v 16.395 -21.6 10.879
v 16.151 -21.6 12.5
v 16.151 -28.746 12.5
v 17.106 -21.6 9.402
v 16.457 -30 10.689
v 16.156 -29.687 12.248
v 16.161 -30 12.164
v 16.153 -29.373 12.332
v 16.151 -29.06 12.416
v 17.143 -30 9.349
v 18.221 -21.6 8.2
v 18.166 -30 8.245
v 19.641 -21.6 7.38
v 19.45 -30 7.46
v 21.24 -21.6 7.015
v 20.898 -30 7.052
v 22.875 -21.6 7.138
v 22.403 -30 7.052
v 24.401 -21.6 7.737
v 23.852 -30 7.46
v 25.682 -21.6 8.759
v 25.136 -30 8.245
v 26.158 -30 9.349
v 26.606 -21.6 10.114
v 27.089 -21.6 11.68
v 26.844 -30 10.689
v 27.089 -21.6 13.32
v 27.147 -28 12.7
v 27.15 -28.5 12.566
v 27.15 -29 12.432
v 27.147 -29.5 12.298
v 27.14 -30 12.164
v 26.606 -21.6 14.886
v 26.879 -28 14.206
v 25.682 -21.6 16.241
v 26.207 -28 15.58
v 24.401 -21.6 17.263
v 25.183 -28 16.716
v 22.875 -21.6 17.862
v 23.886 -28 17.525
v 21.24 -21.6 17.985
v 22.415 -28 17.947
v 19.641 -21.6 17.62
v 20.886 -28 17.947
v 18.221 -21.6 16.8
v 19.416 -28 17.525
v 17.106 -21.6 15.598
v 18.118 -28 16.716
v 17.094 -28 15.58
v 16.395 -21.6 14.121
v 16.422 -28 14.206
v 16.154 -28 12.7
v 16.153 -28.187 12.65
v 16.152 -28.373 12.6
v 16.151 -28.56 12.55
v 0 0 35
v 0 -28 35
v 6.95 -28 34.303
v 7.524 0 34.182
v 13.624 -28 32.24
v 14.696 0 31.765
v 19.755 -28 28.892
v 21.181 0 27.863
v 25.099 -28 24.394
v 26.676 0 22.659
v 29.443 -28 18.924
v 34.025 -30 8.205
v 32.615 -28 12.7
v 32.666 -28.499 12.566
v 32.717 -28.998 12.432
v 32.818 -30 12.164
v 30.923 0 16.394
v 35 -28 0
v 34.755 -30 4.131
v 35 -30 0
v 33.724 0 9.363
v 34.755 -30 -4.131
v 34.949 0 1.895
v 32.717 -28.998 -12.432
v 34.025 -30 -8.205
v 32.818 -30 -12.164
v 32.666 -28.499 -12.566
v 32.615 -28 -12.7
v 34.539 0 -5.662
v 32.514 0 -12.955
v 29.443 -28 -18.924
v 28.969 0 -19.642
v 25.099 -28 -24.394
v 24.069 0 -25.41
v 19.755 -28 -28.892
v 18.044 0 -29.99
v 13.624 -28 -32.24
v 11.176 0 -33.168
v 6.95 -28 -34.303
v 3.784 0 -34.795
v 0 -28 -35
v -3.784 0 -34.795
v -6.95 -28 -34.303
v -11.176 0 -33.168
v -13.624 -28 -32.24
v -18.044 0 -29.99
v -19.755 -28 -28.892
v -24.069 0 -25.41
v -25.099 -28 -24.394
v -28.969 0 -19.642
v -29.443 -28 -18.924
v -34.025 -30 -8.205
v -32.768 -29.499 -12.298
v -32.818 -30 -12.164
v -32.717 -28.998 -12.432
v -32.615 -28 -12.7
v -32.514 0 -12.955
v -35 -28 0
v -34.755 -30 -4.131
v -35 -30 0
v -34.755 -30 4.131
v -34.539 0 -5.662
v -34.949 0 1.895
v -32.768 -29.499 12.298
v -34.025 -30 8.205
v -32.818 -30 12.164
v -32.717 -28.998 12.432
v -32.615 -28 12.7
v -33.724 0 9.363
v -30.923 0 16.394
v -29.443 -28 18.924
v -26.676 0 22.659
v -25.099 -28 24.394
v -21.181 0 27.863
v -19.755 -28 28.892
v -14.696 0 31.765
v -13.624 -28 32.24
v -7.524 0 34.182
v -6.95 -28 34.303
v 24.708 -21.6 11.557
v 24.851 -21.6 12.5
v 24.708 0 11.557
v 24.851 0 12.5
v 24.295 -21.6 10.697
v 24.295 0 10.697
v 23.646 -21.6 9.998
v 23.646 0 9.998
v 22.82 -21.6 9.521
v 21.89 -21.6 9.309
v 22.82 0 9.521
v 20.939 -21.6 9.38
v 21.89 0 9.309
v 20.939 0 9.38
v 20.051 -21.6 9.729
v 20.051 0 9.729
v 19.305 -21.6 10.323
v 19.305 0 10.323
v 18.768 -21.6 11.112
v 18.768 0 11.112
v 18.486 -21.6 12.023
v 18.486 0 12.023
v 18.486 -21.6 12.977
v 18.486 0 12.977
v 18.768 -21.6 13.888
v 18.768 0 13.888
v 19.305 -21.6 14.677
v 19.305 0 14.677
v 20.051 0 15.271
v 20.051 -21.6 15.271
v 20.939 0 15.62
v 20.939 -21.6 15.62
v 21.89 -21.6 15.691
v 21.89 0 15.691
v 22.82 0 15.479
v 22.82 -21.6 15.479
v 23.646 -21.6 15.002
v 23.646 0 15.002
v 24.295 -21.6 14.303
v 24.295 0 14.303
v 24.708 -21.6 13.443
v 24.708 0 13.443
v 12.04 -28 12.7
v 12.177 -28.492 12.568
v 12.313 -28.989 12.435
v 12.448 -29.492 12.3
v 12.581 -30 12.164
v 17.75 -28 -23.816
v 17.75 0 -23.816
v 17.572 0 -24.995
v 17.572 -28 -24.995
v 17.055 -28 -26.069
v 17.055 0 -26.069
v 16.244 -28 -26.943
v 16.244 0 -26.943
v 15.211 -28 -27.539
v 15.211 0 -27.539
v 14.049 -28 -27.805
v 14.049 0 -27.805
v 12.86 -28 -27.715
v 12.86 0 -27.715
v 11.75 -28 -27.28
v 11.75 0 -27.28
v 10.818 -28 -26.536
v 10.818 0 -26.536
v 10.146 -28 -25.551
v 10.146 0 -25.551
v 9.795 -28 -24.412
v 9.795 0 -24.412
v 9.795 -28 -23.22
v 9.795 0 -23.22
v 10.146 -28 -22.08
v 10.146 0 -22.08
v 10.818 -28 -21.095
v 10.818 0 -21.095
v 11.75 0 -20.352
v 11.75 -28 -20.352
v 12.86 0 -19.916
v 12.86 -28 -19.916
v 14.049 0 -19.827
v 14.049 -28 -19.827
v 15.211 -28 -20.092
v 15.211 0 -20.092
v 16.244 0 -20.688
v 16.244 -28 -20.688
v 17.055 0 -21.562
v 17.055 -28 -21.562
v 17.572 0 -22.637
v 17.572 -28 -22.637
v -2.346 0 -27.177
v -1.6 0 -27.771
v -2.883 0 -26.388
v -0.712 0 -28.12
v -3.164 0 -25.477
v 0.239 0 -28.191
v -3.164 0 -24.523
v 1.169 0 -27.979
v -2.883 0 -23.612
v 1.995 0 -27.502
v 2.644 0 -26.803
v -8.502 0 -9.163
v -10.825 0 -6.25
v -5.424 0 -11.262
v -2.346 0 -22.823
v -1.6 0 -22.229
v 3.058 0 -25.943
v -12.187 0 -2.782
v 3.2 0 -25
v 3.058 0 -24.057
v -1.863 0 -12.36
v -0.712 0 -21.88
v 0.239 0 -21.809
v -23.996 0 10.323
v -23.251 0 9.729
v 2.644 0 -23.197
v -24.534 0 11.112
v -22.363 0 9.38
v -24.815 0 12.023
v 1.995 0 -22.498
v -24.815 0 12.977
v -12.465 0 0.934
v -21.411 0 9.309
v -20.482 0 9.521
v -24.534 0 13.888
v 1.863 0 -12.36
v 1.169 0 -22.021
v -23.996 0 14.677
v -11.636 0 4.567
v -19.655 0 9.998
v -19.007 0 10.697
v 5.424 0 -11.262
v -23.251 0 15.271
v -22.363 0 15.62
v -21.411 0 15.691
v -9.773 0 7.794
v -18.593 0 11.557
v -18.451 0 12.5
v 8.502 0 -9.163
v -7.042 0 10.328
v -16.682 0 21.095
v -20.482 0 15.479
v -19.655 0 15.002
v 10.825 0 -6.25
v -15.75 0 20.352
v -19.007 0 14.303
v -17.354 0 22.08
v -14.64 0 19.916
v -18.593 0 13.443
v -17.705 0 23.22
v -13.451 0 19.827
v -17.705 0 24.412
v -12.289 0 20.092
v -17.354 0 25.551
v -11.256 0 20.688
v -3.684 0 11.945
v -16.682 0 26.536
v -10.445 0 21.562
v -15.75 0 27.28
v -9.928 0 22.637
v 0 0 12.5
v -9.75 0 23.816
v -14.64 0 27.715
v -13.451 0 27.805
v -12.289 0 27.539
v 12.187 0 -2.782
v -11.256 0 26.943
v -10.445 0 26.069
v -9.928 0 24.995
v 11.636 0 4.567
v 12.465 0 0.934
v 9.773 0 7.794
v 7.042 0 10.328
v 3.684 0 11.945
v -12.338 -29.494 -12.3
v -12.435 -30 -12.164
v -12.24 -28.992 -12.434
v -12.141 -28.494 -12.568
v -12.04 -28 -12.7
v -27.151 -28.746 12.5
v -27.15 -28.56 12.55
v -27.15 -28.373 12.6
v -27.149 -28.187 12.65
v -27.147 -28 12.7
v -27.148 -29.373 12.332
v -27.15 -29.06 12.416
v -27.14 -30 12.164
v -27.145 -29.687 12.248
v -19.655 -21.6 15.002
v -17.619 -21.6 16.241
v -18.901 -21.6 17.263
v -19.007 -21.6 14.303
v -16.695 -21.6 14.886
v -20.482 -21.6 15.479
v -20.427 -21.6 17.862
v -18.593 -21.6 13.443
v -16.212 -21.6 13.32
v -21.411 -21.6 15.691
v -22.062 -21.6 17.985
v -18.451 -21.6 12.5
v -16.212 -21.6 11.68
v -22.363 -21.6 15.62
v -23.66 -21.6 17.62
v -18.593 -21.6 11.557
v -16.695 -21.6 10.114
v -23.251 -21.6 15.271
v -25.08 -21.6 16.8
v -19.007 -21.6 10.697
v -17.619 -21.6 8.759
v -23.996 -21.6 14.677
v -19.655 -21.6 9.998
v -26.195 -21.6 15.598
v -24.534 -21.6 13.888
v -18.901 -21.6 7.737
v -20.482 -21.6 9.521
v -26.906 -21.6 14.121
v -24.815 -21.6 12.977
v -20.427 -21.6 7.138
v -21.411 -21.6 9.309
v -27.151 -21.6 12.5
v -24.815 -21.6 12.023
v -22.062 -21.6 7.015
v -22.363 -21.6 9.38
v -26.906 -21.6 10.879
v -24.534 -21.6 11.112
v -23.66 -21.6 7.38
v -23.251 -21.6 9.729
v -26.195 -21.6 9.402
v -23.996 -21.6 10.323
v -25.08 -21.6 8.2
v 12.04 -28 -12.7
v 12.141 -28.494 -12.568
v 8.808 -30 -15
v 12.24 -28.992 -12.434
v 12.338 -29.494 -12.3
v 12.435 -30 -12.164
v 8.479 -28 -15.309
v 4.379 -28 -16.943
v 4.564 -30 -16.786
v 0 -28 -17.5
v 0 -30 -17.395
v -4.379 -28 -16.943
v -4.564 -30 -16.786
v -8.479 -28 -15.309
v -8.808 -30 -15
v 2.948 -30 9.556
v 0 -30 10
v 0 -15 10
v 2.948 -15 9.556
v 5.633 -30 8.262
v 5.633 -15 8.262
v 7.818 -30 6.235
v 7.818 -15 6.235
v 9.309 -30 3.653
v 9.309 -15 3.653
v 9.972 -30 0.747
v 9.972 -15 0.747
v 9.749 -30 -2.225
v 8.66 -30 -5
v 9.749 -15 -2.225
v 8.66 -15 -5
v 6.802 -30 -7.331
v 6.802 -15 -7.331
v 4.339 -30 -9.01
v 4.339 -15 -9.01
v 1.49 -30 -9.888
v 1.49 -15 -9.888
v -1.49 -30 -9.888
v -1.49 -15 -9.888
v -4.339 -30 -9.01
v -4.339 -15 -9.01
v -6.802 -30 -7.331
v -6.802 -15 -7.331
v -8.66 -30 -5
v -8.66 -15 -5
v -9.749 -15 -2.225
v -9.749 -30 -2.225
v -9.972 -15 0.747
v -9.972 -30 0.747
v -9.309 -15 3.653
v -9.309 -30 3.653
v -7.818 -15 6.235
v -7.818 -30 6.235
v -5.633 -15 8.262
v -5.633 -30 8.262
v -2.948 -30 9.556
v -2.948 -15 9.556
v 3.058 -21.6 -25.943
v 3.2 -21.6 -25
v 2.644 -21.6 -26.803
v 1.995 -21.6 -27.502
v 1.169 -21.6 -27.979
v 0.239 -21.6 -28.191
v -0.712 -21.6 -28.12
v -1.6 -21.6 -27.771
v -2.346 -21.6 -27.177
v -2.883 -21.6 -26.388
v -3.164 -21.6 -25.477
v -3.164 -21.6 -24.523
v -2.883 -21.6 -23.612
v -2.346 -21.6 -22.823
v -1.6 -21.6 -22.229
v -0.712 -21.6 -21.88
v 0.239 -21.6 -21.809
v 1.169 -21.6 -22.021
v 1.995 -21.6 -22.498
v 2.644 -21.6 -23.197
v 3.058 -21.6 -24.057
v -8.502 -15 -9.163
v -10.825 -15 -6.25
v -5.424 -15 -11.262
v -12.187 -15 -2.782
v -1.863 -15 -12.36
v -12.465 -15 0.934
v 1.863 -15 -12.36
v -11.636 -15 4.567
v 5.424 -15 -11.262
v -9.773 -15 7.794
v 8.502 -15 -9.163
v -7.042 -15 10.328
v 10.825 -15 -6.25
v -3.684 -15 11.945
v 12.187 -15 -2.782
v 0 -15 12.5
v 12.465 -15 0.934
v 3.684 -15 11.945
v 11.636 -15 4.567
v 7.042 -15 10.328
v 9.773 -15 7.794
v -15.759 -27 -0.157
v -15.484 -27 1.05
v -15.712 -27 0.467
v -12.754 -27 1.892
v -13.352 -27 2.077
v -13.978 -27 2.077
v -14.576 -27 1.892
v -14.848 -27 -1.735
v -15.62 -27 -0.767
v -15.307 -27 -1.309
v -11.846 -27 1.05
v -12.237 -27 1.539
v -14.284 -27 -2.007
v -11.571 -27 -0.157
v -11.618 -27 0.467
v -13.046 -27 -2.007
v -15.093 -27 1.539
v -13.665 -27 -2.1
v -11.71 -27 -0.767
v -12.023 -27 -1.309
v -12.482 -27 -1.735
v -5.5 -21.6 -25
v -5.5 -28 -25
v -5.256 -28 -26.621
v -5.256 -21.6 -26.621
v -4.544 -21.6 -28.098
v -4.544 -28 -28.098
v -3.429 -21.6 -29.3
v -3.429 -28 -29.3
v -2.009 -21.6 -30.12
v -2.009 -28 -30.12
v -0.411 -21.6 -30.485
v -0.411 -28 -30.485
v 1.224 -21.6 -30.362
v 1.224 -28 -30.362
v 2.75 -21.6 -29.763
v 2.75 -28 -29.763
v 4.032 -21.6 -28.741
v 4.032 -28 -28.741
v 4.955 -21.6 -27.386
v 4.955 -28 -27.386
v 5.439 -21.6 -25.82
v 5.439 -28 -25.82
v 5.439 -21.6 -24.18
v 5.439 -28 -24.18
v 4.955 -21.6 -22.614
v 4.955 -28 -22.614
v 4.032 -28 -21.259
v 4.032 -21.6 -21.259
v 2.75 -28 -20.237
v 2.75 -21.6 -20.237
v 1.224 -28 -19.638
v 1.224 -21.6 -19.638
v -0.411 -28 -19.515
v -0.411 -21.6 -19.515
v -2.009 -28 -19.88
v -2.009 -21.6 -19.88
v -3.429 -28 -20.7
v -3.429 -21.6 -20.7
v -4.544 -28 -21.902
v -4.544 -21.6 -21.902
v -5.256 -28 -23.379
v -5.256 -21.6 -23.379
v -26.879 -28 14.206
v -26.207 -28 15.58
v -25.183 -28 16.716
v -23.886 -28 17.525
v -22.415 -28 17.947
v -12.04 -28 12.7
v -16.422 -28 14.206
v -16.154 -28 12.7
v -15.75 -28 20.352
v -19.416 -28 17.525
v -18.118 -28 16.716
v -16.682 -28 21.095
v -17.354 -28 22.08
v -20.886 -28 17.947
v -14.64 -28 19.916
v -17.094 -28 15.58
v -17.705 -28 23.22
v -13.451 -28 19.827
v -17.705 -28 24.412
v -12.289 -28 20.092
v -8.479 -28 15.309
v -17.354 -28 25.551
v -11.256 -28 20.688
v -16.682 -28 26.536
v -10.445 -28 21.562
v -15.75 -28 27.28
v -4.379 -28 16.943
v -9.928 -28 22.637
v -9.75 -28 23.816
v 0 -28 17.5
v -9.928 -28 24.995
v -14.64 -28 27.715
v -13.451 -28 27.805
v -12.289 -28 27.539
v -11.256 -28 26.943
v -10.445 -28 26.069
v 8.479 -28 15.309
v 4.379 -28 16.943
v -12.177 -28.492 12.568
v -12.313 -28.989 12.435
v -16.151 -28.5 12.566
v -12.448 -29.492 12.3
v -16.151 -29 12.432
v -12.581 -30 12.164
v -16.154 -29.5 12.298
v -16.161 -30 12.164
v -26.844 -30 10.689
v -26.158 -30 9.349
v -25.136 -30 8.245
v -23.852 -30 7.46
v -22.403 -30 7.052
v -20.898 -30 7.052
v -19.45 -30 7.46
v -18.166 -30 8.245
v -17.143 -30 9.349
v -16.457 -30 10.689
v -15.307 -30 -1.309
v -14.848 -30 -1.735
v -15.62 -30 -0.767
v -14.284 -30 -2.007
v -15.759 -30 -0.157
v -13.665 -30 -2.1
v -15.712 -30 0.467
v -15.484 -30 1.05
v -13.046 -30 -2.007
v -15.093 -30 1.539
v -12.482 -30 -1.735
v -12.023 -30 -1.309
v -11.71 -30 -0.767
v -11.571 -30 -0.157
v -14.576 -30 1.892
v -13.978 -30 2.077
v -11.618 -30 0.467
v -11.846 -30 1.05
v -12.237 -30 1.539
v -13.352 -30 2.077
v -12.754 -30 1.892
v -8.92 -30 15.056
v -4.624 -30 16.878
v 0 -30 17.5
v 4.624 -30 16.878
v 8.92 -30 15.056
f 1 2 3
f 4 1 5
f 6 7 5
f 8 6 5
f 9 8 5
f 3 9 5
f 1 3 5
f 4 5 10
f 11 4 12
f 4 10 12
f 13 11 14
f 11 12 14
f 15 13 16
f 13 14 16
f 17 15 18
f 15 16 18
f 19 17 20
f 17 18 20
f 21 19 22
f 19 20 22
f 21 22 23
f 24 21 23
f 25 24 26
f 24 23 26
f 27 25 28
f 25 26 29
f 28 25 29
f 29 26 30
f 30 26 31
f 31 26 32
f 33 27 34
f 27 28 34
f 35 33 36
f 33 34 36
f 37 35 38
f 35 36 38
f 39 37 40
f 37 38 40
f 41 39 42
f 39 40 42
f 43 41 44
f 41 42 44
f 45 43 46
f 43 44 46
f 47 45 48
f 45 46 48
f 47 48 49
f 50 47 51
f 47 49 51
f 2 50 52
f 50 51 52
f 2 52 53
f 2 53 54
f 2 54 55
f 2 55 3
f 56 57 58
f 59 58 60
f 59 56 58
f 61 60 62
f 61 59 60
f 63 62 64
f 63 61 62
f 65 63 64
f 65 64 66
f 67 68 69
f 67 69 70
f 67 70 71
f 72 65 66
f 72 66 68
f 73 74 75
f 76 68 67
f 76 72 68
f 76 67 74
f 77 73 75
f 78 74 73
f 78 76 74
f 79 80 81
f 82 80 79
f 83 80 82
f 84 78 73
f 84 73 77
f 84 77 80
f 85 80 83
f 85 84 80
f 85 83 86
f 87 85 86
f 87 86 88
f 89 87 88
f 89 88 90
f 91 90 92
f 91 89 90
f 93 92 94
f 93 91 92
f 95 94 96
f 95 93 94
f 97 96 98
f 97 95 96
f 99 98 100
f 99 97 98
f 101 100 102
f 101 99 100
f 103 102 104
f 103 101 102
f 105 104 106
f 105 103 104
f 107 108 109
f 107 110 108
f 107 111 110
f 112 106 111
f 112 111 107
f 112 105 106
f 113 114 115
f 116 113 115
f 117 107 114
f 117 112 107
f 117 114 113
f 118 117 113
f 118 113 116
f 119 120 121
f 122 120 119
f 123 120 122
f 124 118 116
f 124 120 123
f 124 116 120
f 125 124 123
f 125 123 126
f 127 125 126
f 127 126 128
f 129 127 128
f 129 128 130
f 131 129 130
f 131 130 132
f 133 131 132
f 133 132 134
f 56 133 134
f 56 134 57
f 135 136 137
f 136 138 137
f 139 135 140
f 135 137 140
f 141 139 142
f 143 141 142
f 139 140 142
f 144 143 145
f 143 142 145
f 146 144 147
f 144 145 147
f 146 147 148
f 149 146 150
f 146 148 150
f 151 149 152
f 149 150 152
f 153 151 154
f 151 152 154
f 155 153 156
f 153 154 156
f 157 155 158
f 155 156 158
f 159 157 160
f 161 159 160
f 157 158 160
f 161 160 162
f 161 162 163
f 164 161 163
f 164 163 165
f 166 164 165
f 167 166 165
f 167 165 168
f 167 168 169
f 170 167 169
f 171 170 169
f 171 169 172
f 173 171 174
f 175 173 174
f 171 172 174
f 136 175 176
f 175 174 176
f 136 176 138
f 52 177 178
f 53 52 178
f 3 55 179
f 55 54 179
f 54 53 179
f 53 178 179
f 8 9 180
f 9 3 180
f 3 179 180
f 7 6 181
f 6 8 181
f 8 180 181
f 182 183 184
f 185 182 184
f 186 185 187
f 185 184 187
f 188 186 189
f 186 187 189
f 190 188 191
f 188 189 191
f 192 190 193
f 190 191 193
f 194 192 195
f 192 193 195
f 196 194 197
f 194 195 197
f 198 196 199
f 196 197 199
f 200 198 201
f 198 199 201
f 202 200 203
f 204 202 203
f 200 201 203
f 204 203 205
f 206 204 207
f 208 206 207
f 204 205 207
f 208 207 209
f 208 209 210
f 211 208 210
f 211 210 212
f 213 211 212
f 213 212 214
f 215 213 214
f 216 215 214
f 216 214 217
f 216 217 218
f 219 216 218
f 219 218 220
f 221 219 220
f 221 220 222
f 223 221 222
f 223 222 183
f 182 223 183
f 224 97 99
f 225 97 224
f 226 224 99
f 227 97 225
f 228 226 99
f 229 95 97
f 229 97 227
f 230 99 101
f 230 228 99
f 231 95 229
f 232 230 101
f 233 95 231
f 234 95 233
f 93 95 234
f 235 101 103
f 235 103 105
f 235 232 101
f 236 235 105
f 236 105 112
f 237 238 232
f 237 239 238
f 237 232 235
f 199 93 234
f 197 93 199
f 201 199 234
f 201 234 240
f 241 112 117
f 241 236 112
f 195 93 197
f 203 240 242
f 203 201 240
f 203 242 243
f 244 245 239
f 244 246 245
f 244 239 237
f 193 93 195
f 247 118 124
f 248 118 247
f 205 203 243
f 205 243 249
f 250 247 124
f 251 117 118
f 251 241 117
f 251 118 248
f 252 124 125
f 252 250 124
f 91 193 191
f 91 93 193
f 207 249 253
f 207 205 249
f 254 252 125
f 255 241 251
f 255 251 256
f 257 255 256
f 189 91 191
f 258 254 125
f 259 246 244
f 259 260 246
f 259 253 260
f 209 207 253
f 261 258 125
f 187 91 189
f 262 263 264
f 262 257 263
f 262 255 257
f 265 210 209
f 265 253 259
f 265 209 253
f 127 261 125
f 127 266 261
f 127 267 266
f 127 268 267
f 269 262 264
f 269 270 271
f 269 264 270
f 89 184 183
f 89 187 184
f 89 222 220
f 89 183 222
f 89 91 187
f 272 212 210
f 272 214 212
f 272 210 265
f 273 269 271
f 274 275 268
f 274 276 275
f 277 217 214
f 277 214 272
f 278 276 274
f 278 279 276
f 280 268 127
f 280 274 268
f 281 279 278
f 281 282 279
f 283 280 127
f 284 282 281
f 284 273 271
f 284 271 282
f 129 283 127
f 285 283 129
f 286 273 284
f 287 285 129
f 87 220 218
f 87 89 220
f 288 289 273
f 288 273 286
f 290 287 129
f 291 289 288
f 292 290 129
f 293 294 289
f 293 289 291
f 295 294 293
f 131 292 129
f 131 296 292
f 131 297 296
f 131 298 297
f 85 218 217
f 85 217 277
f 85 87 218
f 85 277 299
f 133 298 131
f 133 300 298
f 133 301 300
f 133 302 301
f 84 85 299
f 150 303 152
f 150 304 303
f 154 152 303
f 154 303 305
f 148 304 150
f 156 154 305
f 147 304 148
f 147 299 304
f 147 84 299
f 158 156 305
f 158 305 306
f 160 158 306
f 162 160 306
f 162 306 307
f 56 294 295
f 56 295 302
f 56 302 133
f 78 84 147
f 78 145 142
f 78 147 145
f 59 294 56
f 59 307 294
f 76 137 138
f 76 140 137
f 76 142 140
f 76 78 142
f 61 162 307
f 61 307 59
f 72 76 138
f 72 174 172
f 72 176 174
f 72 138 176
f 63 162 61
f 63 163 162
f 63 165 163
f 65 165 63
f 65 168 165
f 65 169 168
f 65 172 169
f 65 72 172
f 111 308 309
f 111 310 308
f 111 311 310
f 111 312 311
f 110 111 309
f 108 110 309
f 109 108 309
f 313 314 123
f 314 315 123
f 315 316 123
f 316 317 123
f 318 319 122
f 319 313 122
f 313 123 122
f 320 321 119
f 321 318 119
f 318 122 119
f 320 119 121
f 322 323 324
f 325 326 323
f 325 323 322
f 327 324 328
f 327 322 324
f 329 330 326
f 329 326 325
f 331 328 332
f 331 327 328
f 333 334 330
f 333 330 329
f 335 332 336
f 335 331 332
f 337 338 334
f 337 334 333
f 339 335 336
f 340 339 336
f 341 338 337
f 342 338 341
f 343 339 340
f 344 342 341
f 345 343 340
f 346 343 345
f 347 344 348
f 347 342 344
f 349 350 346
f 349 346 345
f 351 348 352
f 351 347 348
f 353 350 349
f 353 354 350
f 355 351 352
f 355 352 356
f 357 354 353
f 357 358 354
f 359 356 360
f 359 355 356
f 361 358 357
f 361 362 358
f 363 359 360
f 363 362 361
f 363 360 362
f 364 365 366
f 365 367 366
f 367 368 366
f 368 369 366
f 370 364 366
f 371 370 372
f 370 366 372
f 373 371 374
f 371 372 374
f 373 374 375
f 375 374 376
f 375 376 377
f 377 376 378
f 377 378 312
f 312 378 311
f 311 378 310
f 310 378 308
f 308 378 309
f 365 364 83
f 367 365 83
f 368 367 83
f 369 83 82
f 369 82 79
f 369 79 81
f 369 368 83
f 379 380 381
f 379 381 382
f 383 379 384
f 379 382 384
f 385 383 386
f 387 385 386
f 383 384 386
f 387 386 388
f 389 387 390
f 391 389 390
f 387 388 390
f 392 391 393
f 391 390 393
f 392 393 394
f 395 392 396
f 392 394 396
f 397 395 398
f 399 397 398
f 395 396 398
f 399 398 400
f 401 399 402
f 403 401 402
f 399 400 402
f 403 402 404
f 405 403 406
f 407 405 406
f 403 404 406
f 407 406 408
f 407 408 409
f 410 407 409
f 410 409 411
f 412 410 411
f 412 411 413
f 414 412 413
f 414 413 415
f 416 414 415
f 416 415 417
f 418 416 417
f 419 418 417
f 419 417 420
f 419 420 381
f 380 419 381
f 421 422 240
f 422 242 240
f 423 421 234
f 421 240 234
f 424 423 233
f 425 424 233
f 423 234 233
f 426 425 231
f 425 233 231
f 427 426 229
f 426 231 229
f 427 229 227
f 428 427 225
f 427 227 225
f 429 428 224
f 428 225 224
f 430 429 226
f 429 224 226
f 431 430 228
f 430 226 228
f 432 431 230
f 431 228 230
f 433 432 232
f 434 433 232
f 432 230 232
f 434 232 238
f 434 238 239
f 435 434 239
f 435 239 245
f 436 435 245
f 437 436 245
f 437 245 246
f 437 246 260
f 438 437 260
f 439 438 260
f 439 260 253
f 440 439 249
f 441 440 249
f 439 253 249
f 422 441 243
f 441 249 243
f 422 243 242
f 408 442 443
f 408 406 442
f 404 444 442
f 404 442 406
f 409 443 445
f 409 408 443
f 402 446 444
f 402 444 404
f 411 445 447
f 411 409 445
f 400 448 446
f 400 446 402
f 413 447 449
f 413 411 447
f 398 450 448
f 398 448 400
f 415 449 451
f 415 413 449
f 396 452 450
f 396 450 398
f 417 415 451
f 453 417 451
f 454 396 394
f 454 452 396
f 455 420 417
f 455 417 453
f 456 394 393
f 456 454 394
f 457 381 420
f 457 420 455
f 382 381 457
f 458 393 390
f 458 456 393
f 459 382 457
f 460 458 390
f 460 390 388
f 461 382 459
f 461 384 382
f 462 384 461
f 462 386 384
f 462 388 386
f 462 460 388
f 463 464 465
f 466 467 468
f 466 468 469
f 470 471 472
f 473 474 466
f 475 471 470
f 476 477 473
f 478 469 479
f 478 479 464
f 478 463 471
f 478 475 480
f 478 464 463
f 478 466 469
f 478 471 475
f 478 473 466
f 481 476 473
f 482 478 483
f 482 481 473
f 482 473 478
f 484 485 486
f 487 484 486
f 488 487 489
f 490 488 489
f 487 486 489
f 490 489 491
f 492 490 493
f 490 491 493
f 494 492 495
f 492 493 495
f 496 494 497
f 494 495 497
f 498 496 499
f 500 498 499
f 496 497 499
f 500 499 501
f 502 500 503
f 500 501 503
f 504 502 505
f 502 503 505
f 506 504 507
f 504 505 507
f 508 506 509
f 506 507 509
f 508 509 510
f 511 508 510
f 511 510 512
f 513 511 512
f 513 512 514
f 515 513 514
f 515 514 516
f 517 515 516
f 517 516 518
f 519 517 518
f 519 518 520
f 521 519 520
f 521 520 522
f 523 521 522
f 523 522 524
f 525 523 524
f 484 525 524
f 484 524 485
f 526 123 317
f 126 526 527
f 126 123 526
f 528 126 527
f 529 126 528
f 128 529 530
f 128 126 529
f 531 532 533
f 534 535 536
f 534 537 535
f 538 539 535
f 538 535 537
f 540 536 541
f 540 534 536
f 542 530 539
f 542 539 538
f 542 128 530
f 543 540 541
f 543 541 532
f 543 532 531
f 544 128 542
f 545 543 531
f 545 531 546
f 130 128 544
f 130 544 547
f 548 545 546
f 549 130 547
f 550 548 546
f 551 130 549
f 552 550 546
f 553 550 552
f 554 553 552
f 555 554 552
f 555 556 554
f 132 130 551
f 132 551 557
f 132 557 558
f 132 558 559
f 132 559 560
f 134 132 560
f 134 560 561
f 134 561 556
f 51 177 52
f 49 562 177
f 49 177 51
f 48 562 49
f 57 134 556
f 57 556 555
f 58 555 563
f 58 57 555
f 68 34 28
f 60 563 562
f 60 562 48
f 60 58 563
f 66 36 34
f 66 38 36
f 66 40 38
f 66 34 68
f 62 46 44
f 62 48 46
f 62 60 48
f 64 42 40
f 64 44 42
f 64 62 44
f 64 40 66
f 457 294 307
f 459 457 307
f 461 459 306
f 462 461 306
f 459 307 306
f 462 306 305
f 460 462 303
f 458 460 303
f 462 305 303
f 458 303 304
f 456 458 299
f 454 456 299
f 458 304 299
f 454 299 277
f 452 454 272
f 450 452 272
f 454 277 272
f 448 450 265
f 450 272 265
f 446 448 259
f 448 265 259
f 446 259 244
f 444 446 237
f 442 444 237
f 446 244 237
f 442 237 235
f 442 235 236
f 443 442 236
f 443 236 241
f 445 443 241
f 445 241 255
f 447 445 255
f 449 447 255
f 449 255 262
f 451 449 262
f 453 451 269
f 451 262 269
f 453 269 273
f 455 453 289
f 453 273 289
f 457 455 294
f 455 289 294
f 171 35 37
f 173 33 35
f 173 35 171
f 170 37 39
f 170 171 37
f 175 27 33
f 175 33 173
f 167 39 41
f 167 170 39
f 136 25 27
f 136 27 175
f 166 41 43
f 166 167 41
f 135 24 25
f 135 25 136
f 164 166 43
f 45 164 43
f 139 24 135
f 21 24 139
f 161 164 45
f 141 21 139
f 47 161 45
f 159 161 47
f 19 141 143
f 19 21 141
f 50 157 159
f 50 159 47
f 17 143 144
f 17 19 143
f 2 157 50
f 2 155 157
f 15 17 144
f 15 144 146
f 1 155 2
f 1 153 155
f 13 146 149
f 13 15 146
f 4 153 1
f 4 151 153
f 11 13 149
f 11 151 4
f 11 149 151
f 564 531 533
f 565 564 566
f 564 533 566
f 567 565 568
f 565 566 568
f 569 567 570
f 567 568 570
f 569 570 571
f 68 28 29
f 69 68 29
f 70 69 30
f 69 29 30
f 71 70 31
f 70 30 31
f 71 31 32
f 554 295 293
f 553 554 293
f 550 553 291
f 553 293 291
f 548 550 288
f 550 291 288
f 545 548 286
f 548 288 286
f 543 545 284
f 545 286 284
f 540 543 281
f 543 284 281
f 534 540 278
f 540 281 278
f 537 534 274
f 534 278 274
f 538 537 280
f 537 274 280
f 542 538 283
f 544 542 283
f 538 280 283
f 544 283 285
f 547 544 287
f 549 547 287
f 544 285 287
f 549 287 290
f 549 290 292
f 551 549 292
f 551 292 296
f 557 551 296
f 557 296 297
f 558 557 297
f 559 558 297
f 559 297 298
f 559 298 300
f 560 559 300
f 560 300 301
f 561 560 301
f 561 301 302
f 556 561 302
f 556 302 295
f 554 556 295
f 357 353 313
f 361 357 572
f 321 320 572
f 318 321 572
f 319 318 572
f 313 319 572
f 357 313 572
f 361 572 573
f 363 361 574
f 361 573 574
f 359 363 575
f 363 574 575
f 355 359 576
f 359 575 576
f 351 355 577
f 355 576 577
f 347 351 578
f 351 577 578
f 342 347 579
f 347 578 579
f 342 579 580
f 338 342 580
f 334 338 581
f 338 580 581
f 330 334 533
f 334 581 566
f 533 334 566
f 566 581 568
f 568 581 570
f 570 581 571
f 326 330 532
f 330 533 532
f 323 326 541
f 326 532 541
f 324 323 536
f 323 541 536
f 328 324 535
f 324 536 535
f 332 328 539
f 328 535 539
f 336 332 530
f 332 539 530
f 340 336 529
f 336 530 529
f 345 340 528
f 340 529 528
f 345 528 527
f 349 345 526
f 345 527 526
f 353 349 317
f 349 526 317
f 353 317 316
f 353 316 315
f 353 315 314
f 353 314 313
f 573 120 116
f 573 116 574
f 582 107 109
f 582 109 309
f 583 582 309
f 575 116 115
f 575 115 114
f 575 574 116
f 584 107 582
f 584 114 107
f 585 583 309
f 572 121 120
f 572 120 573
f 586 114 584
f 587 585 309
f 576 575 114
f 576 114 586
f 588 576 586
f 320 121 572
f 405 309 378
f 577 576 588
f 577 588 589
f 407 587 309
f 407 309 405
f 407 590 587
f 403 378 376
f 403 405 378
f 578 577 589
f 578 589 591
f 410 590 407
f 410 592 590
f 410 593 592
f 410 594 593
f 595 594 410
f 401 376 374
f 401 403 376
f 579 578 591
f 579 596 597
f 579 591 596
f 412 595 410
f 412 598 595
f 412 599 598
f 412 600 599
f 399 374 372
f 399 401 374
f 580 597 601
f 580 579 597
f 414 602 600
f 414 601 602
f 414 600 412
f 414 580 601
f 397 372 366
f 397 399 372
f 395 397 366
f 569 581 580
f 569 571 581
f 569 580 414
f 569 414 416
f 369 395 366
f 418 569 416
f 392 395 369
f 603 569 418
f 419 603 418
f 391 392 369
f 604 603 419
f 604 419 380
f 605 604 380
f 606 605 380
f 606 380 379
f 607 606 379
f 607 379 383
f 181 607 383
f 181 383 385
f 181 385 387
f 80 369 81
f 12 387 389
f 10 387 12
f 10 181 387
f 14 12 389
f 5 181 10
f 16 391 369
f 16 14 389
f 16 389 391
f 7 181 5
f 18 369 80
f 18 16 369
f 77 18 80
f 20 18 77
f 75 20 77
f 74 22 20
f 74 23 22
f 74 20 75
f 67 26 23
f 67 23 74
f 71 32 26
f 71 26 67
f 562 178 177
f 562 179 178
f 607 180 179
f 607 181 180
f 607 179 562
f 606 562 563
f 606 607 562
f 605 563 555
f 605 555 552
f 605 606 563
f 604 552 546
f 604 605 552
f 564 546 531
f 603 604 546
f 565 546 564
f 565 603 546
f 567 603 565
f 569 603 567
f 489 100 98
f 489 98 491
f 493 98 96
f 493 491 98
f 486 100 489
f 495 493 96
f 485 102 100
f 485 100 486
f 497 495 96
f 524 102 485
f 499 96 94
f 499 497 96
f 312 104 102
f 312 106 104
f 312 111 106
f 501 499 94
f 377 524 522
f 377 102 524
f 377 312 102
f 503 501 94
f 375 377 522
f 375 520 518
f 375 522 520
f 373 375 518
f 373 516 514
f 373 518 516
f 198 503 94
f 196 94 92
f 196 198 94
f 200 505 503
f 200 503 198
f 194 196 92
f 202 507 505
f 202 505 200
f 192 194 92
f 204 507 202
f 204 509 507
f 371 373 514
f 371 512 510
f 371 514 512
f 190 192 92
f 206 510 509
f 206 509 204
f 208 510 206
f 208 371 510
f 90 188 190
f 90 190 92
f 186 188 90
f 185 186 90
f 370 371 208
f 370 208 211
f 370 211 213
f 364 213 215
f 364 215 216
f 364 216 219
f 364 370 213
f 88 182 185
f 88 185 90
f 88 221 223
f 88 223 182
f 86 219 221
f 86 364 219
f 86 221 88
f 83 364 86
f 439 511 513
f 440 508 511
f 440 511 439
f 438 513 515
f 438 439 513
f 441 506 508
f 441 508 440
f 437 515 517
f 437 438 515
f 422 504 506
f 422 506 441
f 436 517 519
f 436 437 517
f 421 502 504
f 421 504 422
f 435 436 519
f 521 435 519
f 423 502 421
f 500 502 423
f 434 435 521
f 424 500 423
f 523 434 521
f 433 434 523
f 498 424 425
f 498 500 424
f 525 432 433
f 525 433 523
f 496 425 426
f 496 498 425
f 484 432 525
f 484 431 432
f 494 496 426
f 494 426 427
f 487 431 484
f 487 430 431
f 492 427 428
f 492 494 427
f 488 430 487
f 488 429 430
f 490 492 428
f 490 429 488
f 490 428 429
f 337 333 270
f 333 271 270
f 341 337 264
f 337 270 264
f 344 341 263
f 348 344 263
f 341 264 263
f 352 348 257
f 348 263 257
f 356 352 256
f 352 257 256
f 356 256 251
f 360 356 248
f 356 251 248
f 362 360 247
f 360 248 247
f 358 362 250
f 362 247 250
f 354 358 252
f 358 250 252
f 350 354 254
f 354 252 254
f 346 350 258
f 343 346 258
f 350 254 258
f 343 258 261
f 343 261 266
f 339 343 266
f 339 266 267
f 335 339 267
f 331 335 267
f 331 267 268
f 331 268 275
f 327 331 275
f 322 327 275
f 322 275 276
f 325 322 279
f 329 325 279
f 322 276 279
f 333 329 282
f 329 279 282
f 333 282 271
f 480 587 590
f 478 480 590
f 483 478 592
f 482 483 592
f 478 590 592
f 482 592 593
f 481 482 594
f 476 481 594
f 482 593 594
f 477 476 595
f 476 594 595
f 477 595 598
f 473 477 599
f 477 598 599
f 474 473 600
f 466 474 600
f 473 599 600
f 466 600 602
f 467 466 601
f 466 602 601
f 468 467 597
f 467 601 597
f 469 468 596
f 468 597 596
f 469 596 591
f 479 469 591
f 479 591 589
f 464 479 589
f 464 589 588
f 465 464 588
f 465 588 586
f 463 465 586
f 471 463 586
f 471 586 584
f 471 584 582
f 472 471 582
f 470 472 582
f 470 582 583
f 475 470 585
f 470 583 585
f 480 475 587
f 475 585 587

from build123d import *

# Parameters (mm, degrees)
SKETCH1_R                                           = 35
SKETCH1_R_2                                         = 10
BOSS_EXTRUDE1_DEPTH                                 = 30
SKETCH4_R                                           = 12.5
CUT_EXTRUDE2_DEPTH                                  = 15
CBORE_FOR_M6_HEX_SOCKET_HEAD_CAP_SCREW1_D           = 6.4
CBORE_FOR_M6_HEX_SOCKET_HEAD_CAP_SCREW1_CBORE_D     = 11
CBORE_FOR_M6_HEX_SOCKET_HEAD_CAP_SCREW1_CBORE_DEPTH = 8.4
F_8_0MM_DOWEL_HOLE1_D                               = 8
SKETCH14_OUTSIDE_W                                  = 92.688
SKETCH14_OUTSIDE_H                                  = 92.688
SKETCH14_OUTSIDE_W_2                                = 70
SKETCH14_OUTSIDE_H_2                                = 25.4
CUT_EXTRUDE3_DEPTH                                  = 2
SKETCH18_R                                          = 2.1
CUT_EXTRUDE5_DEPTH                                  = 3
CUT_EXTRUDE6_DEPTH                                  = 58.879184825
CUT_EXTRUDE6_DEPTH_BACK                             = 58.879184825
BOSS_EXTRUDE2_DEPTH                                 = 2
DRAFT1_ANGLE                                        = 3


with BuildPart() as part:
    # Sketch1 → Boss-Extrude1 (new body)
    with BuildSketch(Plane(origin=(0, 0, 0), x_dir=(1, 0, 0), z_dir=(0, 1, 0))):
        with Locations(Location((0, 0, 0), (0, 0, 270))):
            Circle(SKETCH1_R)
        with Locations(Location((0, 0, 0), (0, 0, 270))):
            Circle(SKETCH1_R_2, mode=Mode.SUBTRACT)
    extrude(amount=-BOSS_EXTRUDE1_DEPTH)

    # Sketch4 → Cut-Extrude2 (cut)
    with BuildSketch(Plane(origin=(0, 0, 0), x_dir=(1, 0, 0), z_dir=(0, 1, 0))):
        with Locations(Location((0, 0, 0), (0, 0, 270))):
            Circle(SKETCH4_R)
    extrude(amount=-CUT_EXTRUDE2_DEPTH, mode=Mode.SUBTRACT)

    # CBORE for M6 Hex Socket Head Cap Screw1 (through all)
    with Locations(Plane(origin=(0, -30, 0), x_dir=(-1, 0, 0), z_dir=(0, -1, 0))):
        with Locations((0, 25), (21.650635095, -12.5), (-21.650635095, -12.5)):
            CounterBoreHole(CBORE_FOR_M6_HEX_SOCKET_HEAD_CAP_SCREW1_D / 2, CBORE_FOR_M6_HEX_SOCKET_HEAD_CAP_SCREW1_CBORE_D / 2, CBORE_FOR_M6_HEX_SOCKET_HEAD_CAP_SCREW1_CBORE_DEPTH)

    # Ø8.0mm Dowel Hole1 (through all)
    with Locations(Plane(origin=(0, -30, 0), x_dir=(-1, 0, 0), z_dir=(0, -1, 0))):
        with Locations((13.75, -23.815698604), (-13.75, 23.815698604)):
            Hole(F_8_0MM_DOWEL_HOLE1_D / 2)

    # Sketch14 outside → Cut-Extrude3 (cut)
    with BuildSketch(Plane.XZ.offset(30)):
        Rectangle(SKETCH14_OUTSIDE_W, SKETCH14_OUTSIDE_H)
        Rectangle(SKETCH14_OUTSIDE_W_2, SKETCH14_OUTSIDE_H_2, mode=Mode.SUBTRACT)
    extrude(amount=-CUT_EXTRUDE3_DEPTH, mode=Mode.SUBTRACT)

    # Sketch18 → Cut-Extrude5 (cut)
    with BuildSketch(Plane.XZ.offset(30)):
        with Locations(Location((-13.665, 0, 0), (0, 0, 270))):
            Circle(SKETCH18_R)
    extrude(amount=-CUT_EXTRUDE5_DEPTH, mode=Mode.SUBTRACT)

    # Sketch19 → Cut-Extrude6 (cut, two sides: drawn at the far end of the back side and taken through both)
    with BuildSketch(Plane(origin=(0, 0, 0), x_dir=(0, 0, -1), z_dir=(1, 0, 0)).offset(-CUT_EXTRUDE6_DEPTH_BACK)):
        Polygon((-12.7, -28), (-12.164101615, -30), (-12.7, -30), align=None)
        Polygon((12.7, -28), (12.164101615, -30), (12.7, -30), align=None)
    extrude(amount=CUT_EXTRUDE6_DEPTH + CUT_EXTRUDE6_DEPTH_BACK, mode=Mode.SUBTRACT)

    # Sketch20 → Boss-Extrude2 (add)
    with BuildSketch(Plane.XZ.offset(30)):
        with BuildLine():
            Line((-12.581122044, 12.164101615), (12.581122044, 12.164101615))
            ThreePointArc((12.581122044, 12.164101615), (0, 17.5), (-12.581122044, 12.164101615))
        make_face()
        with BuildLine():
            Line((-12.581122044, -12.164101615), (12.581122044, -12.164101615))
            ThreePointArc((12.581122044, -12.164101615), (0, -17.5), (-12.581122044, -12.164101615))
        make_face()
    extrude(amount=-BOSS_EXTRUDE2_DEPTH)

    # Draft1
    draft1_faces = [part.faces().sort_by_distance(p)[0] for p in [
        (0, -29, -17.5),
    ]]
    draft(draft1_faces, Plane(origin=(0, -28, 0), x_dir=(0, 0, -1), z_dir=(0, -1, 0)), DRAFT1_ANGLE)


solid = part.part
